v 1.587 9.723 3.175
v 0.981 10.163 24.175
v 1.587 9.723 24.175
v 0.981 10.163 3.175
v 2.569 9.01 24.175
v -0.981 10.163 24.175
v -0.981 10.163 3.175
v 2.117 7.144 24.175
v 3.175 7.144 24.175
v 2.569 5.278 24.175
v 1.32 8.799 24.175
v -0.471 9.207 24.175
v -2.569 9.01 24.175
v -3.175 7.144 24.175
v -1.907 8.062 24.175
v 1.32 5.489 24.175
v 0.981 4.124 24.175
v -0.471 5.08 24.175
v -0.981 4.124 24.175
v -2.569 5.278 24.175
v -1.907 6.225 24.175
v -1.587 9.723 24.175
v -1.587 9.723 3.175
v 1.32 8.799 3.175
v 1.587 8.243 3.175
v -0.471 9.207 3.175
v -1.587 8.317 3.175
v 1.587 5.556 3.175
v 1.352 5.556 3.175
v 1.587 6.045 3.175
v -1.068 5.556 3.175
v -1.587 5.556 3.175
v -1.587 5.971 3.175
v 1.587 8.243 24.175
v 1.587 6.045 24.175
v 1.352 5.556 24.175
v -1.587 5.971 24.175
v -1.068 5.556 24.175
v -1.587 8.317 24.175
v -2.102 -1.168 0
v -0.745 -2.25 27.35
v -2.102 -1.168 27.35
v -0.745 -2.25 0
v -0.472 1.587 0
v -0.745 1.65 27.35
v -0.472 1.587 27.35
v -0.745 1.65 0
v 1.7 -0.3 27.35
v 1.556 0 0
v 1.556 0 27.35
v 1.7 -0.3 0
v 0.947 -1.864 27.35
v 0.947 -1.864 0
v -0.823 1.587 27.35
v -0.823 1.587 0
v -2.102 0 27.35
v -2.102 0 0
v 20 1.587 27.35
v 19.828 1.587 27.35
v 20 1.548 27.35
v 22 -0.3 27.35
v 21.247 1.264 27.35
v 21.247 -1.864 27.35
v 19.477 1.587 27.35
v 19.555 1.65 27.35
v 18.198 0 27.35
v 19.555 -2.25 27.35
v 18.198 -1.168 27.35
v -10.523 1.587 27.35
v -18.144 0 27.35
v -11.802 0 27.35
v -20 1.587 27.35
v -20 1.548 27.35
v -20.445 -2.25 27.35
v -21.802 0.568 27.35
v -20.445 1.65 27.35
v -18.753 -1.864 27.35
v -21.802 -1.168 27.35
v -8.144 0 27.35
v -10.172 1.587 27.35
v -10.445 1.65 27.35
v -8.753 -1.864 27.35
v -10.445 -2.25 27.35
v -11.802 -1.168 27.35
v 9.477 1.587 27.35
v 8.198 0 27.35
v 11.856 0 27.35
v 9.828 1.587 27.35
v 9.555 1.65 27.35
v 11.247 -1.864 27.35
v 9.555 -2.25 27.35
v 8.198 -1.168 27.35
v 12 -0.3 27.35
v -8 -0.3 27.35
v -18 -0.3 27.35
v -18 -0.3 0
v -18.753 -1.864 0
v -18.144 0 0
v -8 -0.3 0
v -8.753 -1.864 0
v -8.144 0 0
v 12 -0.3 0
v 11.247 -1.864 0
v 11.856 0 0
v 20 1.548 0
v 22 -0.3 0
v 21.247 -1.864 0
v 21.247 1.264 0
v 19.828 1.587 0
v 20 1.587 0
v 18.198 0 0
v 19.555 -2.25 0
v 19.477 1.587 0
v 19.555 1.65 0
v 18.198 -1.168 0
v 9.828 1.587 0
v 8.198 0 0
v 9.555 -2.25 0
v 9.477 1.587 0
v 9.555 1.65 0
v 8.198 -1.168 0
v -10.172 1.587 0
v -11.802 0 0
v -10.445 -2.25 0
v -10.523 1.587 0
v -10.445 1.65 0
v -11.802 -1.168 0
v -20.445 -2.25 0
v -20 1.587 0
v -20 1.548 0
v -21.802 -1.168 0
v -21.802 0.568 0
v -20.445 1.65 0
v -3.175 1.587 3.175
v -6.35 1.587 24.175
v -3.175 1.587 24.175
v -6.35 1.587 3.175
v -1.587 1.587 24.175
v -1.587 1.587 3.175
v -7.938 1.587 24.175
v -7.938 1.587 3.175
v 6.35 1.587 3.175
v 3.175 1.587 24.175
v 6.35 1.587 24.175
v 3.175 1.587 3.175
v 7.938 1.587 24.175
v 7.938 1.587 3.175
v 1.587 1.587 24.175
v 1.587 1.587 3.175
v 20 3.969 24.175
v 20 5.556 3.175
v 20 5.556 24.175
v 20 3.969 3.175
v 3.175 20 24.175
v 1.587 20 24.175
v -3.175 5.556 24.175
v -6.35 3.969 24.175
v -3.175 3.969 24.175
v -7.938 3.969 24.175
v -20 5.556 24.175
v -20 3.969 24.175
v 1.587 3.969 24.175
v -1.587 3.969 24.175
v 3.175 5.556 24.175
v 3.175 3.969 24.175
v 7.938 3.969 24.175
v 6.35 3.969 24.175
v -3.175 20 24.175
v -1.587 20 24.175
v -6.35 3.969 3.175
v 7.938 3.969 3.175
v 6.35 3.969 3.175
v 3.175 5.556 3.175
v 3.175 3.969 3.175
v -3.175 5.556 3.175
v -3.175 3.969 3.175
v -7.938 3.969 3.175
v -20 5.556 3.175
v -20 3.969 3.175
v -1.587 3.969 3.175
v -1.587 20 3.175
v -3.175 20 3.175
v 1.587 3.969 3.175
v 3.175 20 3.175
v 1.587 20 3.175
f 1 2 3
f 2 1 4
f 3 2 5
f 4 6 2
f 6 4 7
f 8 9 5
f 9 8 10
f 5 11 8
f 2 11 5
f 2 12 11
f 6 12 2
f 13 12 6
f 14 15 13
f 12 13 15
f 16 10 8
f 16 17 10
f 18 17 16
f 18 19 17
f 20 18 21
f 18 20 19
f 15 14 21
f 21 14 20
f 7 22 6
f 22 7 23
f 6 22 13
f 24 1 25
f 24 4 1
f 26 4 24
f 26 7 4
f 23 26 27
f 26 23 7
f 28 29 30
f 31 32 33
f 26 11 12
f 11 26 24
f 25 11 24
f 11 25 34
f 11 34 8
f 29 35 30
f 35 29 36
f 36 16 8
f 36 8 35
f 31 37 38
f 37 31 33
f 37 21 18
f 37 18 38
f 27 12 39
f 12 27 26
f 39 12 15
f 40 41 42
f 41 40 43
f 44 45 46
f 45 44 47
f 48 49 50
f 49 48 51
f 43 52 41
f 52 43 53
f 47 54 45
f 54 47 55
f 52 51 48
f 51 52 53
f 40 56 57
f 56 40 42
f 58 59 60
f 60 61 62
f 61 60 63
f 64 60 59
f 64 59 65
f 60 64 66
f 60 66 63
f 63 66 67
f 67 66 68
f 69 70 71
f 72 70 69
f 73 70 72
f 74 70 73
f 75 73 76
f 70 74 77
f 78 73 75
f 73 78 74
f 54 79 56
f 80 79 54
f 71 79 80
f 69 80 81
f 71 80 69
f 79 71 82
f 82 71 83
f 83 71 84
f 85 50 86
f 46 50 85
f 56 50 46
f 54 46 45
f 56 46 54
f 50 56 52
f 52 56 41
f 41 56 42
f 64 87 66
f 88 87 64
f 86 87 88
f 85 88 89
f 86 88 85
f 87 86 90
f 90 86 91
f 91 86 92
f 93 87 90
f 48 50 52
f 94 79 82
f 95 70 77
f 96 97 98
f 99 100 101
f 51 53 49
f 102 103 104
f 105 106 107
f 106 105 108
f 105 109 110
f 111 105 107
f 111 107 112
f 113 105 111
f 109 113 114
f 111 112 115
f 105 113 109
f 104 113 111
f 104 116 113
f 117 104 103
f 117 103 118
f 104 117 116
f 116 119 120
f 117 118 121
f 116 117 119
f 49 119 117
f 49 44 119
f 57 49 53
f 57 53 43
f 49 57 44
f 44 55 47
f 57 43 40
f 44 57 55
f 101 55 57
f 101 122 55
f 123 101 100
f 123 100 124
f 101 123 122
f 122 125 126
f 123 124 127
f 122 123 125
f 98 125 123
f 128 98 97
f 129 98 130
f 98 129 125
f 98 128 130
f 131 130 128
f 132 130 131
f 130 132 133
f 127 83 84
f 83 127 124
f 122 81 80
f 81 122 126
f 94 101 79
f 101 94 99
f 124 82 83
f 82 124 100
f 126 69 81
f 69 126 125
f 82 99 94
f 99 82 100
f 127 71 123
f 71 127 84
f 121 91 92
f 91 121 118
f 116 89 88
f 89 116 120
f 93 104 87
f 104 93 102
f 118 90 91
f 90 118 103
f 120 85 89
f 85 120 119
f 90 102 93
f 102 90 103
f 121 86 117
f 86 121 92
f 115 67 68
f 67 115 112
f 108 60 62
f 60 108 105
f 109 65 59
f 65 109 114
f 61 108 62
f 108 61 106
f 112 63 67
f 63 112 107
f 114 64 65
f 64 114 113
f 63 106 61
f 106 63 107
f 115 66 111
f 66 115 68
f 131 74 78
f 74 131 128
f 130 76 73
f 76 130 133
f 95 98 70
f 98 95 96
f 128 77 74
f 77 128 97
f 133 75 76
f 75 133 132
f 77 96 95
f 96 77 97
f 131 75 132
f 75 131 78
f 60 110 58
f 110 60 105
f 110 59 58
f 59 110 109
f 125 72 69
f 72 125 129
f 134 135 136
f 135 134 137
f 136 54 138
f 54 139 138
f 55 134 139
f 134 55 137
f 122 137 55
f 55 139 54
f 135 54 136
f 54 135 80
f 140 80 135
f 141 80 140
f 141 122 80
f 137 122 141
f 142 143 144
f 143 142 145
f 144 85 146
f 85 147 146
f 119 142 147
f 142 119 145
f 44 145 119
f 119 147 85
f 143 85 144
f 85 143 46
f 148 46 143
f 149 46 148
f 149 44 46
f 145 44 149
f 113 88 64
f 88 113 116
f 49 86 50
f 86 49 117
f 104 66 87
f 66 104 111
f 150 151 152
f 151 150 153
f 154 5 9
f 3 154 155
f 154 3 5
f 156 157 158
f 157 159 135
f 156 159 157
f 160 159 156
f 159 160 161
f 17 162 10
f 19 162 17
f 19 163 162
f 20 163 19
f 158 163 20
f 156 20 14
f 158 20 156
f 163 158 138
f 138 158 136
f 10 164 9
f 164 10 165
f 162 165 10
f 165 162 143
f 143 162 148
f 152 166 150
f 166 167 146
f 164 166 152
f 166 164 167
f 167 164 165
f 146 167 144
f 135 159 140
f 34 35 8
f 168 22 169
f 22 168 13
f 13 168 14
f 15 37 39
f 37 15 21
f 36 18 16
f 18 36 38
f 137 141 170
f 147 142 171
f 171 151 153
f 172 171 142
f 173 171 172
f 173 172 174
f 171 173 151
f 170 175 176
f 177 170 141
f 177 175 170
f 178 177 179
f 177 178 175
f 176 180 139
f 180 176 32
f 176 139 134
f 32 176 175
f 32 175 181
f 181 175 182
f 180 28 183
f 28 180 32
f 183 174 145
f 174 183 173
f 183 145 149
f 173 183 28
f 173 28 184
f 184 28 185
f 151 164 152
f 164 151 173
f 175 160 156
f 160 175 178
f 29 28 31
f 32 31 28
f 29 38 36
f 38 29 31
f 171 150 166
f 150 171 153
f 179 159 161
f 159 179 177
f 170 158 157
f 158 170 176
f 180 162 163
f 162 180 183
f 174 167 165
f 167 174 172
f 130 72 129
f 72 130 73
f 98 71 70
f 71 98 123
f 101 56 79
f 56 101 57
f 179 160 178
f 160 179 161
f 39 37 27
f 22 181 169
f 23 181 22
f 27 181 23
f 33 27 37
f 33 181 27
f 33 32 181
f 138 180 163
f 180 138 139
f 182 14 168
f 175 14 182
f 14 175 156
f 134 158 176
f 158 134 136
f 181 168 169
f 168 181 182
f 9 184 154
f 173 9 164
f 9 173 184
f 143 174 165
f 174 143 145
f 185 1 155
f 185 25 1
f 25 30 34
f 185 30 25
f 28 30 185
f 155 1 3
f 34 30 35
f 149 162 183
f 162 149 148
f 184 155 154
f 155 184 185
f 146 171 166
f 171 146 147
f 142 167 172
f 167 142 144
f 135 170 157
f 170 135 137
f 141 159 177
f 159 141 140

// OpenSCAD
// file: v2/splice.scad
/**
 * t-splice.scad is part of Paper Laptop project.
 *
 * @author R. S. Doiel, <rsdoiel@gmail.com>
 * copyright (c) 2016 all rights reserved
 * Released under a BSD 2-clause license
 */

/*
# misc notes

|  Inches   | Inches    |  Millimeters |
|(fraction) | (decimal) |              |
+-----------+-----------+--------------+
|    1/16   |    0.0625 | 1.5875       |
|    1/8    |    0.125  | 3.175        |
|    3/16   |    0.1875 | 4.7625       |
|    1/4    |    0.25   | 6.35         |
|    3/8    |    0.375  | 9.525        |
|    1/2    |    0.5    | 12.7         |
|    5/8    |    0.625  | 15.875       |
|    3/4    |    0.75   | 19.05        |
|    7/8    |    0.875  | 22.225       |
|    1      |    1.0    | 25.4         |

## Raspberry Pi Dimensions

85.60mm x 56mm x 21mm
(or roughly 3.37″ x 2.21″ x 0.83″)

 */

 /*
  * Splice: basic splice, units assumed is 1mm
  */
module Splice() {
    // sizing and spacing
    t = 3.175;// Aprox. 1/8 inch.
    side_t = t/2;
    side_l = 20;
    b_spacing = side_l/2;
    inner_h = 21;
    inner_t = t*1.25;
    outer_t = side_t;
    outer_h = inner_h+(2*t);
    bump_r = 2;
    bump_o = -0.3;

    // main fastening surface
    translate([0, t*2.25, t]) {
        difference() {
            // fastener body
            color([1,0,0]) cylinder(h=inner_h, r=t, center=false);
            // bolt hole
            color([0,0,0]) cylinder(h=inner_h, r=t/1.5, center=false);
        }
    }

    // corner bumper
    translate([bump_o, bump_o, 0]) {
        color([1,0,0]) cylinder(h=outer_h, r=bump_r, center=false);
    }

    // middle bumpers side a
    translate([b_spacing * -1, bump_o,0]) {
        color([1,0,0]) cylinder(h=outer_h, r=bump_r, center=false);
    }

    // middle bumpers side b
    translate([b_spacing, bump_o, 0]) {
        color([1,0,0]) cylinder(h=outer_h, r=bump_r, center=false);
    }

    // end bumpers
    translate([side_l, bump_o, 0]) {
        color([1,0,0]) cylinder(h=outer_h, r=bump_r, center=false);
    }
    translate([side_l*-1, bump_o, 0]) {
        color([1,0,0]) cylinder(h=outer_h, r=bump_r, center=false);
    }

    // outer side a
    translate([0, 0, 0]) {
       color([0,1,0]) cube([side_l, side_t, outer_h], center=false);
    }

    // Inner side a
    translate([0, t*1.25, t]) {
       color([0,1,0]) cube([side_l, side_t, inner_h], center=false);
    }

    // outer side b
    translate([-1 * side_l, 0, 0]) {
       color([1,1,0]) cube([side_l, side_t, outer_h], center=false);
    }

    // Inner side b
    translate([side_l*-1, t*1.25, t]) {
       color([1,1,0]) cube([side_l, side_t, inner_h], center=false);
    }

    // filler corner
    translate([8, 1, t]) {
       color([0,0, 1]) cube([outer_t, inner_t, inner_h], center=false);
    }
    translate([-8, 1, t]) {
       color([0,0, 1]) cube([outer_t, inner_t, inner_h], center=false);
    }
}

/*
 * SpliceT: A T shaped splice, units assumed is 1mm
 */
module SpliceT() {
   // sizing and spacing
   t = 3.175;// Aprox. 1/8 inch.
   side_t = t/2;
   side_l = 20;
   b_spacing = side_l/2;
   inner_h = 21;
   inner_t = t*1.25;
   outer_t = side_t;
   outer_h = inner_h+(2*t);
   bump_r = 2;
   bump_o = -0.3;

   // main fastening surface
   translate([0, t*2.25, t]) {
       difference() {
           // fastener body
           color([1,0,1]) cylinder(h=inner_h, r=t, center=false);
           // bolt hole
           color([0,0,0]) cylinder(h=inner_h, r=t/1.5, center=false);
       }
   }

   // corner bumper
   translate([bump_o, bump_o, 0]) {
       color([1,0,0]) cylinder(h=outer_h, r=bump_r, center=false);
   }

   // middle bumpers side a
   translate([b_spacing * -1, bump_o,0]) {
       color([1,0,0]) cylinder(h=outer_h, r=bump_r, center=false);
   }

   // middle bumpers side b
   translate([b_spacing, bump_o, 0]) {
       color([1,0,0]) cylinder(h=outer_h, r=bump_r, center=false);
   }

   // end bumpers
   translate([side_l, bump_o, 0]) {
       color([1,0,0]) cylinder(h=outer_h, r=bump_r, center=false);
   }
   translate([side_l*-1, bump_o, 0]) {
       color([1,0,0]) cylinder(h=outer_h, r=bump_r, center=false);
   }

   // outer side a
   translate([0, 0, 0]) {
      color([0,1,0]) cube([side_l, side_t, outer_h], center=false);
   }

   // inner side a
   translate([0, t*1.25, t]) {
      color([0,1,0]) cube([side_l, side_t, inner_h], center=false);
   }

   // outer side b
   translate([-1 * side_l, 0, 0]) {
      color([1,1,0]) cube([side_l, side_t, outer_h], center=false);
   }

   // inner side b
   translate([side_l*-1, t*1.25, t]) {
      color([1,1,0]) cube([side_l, side_t, inner_h], center=false);
   }

   // port side c
   translate([t*-1, 0, t]) {
      color([0,1,1]) cube([side_t, side_l, inner_h], center=false);
   }

   // starboard side c
   translate([t/2, 0, t]) {
      color([0,1,1]) cube([side_t, side_l, inner_h], center=false);
   }

   // filler corner
   translate([2*t, 1, t]) {
      color([0,0, 1]) cube([outer_t, inner_t, inner_h], center=false);
   }
   translate([-2.5*t, 1, t]) {
      color([0,0, 1]) cube([outer_t, inner_t, inner_h], center=false);
   }
}
// main file
/**
 * test-spliceT.scad is part of Paper Laptop project.
 *
 * @author R. S. Doiel, <rsdoiel@gmail.com>
 * copyright (c) 2016 all rights reserved
 * Released under a BSD 2-clause license
 */
include <v2/splice.scad>

SpliceT();
